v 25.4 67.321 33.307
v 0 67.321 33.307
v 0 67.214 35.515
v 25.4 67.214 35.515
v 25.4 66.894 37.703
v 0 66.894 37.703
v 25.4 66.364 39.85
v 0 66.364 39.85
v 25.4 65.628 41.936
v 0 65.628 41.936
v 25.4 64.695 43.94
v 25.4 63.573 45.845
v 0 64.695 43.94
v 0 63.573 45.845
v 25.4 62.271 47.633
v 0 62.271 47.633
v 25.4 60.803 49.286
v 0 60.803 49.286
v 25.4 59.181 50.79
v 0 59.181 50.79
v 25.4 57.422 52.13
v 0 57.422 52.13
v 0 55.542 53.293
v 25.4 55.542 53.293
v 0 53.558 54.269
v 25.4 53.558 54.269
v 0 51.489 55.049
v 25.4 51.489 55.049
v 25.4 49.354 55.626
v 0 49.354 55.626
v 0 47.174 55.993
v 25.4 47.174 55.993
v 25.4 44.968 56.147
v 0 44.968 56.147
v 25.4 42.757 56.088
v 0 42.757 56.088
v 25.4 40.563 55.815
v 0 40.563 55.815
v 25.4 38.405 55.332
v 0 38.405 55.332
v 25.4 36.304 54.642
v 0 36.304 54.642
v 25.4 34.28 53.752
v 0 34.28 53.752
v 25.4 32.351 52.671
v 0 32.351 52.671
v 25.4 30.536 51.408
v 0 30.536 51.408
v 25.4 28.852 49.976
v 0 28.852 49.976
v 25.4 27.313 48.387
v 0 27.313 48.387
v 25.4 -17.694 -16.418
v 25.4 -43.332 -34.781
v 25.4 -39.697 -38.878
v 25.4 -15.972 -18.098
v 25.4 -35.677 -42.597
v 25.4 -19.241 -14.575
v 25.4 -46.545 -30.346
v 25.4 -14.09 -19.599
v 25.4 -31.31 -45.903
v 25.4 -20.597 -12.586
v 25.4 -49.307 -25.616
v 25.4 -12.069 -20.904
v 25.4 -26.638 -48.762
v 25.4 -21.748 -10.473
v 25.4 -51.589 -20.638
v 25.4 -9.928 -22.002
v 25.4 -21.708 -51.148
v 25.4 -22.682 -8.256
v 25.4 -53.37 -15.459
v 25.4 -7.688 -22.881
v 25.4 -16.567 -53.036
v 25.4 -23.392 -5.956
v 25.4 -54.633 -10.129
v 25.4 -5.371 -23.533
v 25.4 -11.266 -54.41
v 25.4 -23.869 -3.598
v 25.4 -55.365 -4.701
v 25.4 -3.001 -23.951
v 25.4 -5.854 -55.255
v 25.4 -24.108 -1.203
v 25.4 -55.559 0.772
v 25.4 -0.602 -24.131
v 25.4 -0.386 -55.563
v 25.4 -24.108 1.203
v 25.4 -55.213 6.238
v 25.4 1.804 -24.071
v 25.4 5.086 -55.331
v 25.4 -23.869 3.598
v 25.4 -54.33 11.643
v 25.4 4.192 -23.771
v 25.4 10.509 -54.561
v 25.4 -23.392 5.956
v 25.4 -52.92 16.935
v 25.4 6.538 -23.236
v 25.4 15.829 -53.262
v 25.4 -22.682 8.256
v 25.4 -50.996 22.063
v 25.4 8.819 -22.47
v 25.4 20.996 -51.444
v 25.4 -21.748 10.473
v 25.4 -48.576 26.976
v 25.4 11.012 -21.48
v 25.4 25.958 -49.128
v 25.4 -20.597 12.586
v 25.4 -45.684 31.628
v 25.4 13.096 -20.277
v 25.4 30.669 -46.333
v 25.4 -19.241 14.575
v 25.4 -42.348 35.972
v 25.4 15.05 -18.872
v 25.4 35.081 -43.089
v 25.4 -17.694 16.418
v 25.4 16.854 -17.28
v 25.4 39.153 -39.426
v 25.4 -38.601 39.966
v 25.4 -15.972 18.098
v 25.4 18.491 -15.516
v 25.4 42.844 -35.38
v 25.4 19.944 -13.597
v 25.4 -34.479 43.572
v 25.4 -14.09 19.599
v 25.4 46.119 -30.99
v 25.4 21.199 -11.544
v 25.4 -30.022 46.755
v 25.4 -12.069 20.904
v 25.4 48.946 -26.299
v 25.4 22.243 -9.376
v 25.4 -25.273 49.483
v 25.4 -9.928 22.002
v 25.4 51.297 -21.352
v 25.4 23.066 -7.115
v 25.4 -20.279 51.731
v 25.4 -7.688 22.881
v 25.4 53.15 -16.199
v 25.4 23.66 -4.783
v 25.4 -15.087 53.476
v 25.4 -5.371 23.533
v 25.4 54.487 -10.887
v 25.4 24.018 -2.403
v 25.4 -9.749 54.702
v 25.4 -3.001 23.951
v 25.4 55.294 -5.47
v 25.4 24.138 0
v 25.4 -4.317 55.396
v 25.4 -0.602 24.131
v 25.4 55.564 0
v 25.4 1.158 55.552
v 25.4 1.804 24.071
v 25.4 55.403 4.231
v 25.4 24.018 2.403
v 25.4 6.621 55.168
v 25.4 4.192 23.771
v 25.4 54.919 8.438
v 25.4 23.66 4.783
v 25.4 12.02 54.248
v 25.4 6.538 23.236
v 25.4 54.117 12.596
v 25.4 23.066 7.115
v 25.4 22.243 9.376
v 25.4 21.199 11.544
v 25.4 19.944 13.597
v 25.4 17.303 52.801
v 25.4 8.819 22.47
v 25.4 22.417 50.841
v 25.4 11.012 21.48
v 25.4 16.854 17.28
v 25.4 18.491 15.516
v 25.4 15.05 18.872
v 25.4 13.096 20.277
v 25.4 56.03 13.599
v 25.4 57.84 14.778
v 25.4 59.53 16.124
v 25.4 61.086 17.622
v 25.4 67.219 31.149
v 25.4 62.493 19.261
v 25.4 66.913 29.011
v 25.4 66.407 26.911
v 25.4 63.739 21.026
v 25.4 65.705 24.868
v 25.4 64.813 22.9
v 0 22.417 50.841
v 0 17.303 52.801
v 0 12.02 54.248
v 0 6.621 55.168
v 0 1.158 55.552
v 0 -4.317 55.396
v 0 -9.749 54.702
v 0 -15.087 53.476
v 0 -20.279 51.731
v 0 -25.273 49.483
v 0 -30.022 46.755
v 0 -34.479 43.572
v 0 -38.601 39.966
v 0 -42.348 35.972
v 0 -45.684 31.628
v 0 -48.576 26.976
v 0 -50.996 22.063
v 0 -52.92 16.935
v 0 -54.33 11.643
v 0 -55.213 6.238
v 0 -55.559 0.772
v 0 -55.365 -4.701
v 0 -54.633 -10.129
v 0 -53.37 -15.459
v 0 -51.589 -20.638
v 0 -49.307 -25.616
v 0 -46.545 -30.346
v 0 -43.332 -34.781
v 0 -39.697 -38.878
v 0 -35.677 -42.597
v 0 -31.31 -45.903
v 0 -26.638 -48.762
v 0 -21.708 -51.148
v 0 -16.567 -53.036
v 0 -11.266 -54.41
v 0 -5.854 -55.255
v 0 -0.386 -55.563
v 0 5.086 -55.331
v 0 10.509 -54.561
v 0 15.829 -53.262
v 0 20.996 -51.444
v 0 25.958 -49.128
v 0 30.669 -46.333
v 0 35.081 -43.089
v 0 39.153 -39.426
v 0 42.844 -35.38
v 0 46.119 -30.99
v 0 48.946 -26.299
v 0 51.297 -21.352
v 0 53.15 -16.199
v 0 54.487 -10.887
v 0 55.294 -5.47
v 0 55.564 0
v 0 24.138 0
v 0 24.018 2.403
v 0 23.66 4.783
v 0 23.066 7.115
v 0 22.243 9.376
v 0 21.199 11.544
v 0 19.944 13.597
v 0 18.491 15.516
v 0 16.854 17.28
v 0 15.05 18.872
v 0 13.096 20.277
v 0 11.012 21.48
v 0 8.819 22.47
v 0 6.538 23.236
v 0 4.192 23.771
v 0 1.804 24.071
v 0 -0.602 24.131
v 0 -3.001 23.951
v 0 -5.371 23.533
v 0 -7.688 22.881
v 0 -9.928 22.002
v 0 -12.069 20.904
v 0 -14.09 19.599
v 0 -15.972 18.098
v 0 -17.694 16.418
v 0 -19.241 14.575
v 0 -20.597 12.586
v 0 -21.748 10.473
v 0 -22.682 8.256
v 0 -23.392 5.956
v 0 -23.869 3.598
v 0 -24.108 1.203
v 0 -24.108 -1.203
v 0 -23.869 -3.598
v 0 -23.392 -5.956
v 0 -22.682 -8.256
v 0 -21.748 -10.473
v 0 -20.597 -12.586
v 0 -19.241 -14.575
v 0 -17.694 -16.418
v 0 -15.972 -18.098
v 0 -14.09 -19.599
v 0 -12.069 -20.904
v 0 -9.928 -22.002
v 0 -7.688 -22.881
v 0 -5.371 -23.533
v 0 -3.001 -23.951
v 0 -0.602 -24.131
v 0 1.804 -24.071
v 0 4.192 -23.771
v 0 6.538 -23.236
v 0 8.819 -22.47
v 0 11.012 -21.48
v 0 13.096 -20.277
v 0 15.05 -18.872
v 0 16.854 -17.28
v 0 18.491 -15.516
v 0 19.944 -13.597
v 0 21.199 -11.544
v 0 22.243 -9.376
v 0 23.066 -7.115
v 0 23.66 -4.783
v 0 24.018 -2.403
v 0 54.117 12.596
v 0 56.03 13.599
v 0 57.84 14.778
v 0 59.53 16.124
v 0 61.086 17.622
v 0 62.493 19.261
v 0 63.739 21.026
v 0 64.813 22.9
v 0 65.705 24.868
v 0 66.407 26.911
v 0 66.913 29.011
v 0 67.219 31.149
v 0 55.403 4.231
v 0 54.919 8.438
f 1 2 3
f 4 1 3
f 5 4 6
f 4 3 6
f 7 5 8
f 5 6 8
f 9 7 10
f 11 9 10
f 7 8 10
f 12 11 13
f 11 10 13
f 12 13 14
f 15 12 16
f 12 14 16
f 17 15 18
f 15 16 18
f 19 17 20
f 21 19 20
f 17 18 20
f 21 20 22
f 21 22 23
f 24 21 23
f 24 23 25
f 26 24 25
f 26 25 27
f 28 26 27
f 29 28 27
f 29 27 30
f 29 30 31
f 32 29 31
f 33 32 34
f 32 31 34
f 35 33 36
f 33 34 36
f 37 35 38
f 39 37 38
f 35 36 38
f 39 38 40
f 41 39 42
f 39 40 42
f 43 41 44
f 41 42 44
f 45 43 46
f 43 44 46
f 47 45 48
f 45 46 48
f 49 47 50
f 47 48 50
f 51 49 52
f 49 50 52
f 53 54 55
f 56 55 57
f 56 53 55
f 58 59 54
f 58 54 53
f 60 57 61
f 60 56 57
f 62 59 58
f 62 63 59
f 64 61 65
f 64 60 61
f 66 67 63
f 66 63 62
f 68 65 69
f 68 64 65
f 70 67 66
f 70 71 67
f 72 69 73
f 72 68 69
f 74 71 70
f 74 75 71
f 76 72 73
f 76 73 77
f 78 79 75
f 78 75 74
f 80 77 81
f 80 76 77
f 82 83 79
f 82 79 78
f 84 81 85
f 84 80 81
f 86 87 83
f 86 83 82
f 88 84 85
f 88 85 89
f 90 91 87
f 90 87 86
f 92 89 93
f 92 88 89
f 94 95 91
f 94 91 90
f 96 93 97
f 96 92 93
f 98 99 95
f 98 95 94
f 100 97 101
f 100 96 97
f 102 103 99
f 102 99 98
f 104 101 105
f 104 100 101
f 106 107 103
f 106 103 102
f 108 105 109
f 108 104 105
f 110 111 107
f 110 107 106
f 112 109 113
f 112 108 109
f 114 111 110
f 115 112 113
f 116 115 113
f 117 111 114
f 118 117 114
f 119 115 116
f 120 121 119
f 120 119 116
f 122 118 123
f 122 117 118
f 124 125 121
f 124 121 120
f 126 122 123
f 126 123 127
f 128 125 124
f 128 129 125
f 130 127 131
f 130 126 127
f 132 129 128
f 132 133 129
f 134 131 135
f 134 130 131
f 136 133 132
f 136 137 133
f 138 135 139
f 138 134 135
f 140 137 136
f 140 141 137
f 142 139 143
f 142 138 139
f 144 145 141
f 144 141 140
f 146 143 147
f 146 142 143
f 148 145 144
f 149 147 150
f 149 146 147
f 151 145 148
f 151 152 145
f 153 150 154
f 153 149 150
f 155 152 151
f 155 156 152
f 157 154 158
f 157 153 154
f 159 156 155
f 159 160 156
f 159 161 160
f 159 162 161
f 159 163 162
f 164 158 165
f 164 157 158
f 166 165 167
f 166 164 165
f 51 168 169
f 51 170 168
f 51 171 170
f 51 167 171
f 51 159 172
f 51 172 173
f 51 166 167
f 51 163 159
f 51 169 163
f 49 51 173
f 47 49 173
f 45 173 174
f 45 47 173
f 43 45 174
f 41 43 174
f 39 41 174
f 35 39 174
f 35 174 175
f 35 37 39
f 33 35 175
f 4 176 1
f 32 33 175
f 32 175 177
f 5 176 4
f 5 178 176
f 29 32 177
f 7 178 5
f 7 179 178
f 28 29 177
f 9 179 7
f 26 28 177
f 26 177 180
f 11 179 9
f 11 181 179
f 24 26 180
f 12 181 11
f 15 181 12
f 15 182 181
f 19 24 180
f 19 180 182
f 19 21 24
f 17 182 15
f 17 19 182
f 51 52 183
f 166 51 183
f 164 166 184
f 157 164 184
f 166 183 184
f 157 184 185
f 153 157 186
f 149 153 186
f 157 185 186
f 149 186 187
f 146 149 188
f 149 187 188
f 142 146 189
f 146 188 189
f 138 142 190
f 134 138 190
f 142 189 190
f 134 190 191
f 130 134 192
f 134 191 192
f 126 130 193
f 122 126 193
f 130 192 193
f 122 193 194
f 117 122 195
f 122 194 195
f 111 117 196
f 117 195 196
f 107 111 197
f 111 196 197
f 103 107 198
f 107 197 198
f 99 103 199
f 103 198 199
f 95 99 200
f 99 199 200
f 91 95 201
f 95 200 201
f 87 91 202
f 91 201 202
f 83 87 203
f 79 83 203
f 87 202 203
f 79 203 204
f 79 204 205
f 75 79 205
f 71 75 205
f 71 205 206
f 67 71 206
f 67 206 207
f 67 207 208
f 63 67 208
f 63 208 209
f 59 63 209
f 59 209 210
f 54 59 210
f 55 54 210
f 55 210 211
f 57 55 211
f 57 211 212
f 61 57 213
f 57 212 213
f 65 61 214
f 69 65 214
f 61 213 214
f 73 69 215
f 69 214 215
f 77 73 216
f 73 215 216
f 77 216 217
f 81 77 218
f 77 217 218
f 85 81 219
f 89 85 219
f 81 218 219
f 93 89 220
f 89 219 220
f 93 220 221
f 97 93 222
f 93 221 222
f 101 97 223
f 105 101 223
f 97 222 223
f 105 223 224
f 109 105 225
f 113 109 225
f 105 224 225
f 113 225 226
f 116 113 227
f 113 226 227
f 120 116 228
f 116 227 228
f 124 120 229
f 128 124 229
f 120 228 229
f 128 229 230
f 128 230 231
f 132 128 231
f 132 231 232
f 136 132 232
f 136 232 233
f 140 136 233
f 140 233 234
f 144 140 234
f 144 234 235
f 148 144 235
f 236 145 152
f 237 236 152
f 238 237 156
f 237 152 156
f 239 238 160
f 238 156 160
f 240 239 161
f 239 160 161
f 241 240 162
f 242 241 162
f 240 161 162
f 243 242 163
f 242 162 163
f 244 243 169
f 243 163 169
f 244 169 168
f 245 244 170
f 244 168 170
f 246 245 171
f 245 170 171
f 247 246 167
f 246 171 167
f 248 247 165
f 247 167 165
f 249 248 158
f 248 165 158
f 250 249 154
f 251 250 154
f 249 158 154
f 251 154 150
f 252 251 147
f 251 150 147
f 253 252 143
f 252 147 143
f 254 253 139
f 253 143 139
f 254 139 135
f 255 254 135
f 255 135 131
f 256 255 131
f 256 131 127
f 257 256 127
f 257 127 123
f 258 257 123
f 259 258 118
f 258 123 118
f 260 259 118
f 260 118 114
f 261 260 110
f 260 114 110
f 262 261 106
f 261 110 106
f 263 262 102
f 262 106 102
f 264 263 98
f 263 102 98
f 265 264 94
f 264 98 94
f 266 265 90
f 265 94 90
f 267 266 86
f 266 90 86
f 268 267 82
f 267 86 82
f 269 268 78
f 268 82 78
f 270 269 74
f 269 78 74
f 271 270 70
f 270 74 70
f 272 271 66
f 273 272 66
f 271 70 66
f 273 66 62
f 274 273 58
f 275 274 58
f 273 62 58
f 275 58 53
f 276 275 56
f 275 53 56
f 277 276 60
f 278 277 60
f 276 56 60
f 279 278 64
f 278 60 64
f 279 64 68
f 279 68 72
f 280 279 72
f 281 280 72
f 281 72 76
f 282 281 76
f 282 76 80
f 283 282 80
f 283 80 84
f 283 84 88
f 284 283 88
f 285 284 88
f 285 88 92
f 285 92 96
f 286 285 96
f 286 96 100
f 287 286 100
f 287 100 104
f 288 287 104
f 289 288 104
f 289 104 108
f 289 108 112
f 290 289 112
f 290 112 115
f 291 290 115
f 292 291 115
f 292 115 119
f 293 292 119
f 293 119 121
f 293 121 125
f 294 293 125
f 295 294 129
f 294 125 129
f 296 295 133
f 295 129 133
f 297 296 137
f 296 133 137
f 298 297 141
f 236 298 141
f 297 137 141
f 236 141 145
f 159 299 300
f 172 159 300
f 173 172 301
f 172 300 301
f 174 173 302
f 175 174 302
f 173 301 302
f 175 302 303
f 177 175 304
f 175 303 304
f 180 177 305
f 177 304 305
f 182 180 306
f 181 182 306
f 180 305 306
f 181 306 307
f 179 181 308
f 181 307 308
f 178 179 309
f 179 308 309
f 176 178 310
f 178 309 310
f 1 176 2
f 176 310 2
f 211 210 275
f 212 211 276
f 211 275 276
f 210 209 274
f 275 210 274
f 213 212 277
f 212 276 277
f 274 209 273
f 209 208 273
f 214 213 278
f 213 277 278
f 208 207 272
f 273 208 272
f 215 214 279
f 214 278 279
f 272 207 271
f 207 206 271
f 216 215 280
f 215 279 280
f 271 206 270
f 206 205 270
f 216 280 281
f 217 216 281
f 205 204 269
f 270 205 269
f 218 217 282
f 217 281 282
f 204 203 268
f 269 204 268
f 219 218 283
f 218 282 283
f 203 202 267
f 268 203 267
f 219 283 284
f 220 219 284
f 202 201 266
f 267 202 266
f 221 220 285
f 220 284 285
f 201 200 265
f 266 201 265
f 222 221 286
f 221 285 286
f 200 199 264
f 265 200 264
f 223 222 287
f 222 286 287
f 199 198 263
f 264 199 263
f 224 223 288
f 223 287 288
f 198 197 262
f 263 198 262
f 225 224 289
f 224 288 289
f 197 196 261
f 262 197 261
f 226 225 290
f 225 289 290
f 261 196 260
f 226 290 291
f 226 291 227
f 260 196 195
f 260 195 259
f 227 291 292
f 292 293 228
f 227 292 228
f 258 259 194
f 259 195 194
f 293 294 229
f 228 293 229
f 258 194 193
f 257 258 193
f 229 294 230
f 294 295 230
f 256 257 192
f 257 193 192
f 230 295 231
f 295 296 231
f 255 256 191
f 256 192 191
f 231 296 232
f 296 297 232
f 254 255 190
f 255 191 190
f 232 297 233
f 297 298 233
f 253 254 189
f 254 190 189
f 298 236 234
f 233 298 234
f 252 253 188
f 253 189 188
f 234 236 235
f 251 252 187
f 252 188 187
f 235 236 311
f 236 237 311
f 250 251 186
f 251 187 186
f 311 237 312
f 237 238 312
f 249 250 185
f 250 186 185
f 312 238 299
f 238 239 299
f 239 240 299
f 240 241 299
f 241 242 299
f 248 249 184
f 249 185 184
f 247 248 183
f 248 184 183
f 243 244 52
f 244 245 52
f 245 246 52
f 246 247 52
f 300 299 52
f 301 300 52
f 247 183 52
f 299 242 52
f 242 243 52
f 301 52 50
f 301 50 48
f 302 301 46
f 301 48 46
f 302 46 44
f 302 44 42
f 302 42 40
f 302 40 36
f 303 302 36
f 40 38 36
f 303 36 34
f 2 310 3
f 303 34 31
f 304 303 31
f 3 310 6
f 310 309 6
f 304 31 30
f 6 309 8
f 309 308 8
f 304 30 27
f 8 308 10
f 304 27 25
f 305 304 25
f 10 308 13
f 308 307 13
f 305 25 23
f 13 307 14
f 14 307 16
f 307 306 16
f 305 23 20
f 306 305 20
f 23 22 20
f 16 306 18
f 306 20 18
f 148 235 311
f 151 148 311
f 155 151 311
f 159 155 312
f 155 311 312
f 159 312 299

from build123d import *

# Parameters (mm, degrees)
F1_DEPTH = 25.4
F3_R     = 24.1381170573
F4_DEPTH = 25.4


# Not quite as in the source:
# - the program builds the solid bodies; features that only make, move or delete a surface that nothing else refers to are left out


with BuildPart() as f1:
    # F0 (on Right) → F1 (new body)
    with BuildSketch(Plane.YZ):
        with BuildLine():
            ThreePointArc((27.3132670653, 48.3872874563), (-47.984242661, -28.0152922777), (55.5638744614, 0))
            ThreePointArc((55.5638744614, 0), (55.2010789182, 6.3391664614), (54.1174299211, 12.5955517503))
            ThreePointArc((54.1174299211, 12.5955517503), (26.1882593397, 19.6121913174), (27.3132670653, 48.3872874563))
        make_face()
        with BuildLine():
            ThreePointArc((27.3132670653, 48.3872874563), (26.1882593397, 19.6121913174), (54.1174299211, 12.5955517503))
            ThreePointArc((54.1174299211, 12.5955517503), (44.4747309057, 33.3067929411), (27.3132670653, 48.3872874563))
        make_face()
        with BuildLine():
            ThreePointArc((27.3132670653, 48.3872874563), (44.4747309057, 33.3067929411), (54.1174299211, 12.5955517503))
            ThreePointArc((54.1174299211, 12.5955517503), (63.739124452, 21.0259013912), (67.3206748777, 33.3067929411))
            ThreePointArc((67.3206748777, 33.3067929411), (52.5328732039, 54.6844330979), (27.3132670653, 48.3872874563))
        make_face()
    extrude(amount=F1_DEPTH)

    # F3 (on face) → F4 (cut)
    with BuildSketch(Plane.YZ.offset(25.4)):
        Circle(F3_R)
    extrude(amount=-F4_DEPTH, mode=Mode.SUBTRACT)


solid = f1.part
